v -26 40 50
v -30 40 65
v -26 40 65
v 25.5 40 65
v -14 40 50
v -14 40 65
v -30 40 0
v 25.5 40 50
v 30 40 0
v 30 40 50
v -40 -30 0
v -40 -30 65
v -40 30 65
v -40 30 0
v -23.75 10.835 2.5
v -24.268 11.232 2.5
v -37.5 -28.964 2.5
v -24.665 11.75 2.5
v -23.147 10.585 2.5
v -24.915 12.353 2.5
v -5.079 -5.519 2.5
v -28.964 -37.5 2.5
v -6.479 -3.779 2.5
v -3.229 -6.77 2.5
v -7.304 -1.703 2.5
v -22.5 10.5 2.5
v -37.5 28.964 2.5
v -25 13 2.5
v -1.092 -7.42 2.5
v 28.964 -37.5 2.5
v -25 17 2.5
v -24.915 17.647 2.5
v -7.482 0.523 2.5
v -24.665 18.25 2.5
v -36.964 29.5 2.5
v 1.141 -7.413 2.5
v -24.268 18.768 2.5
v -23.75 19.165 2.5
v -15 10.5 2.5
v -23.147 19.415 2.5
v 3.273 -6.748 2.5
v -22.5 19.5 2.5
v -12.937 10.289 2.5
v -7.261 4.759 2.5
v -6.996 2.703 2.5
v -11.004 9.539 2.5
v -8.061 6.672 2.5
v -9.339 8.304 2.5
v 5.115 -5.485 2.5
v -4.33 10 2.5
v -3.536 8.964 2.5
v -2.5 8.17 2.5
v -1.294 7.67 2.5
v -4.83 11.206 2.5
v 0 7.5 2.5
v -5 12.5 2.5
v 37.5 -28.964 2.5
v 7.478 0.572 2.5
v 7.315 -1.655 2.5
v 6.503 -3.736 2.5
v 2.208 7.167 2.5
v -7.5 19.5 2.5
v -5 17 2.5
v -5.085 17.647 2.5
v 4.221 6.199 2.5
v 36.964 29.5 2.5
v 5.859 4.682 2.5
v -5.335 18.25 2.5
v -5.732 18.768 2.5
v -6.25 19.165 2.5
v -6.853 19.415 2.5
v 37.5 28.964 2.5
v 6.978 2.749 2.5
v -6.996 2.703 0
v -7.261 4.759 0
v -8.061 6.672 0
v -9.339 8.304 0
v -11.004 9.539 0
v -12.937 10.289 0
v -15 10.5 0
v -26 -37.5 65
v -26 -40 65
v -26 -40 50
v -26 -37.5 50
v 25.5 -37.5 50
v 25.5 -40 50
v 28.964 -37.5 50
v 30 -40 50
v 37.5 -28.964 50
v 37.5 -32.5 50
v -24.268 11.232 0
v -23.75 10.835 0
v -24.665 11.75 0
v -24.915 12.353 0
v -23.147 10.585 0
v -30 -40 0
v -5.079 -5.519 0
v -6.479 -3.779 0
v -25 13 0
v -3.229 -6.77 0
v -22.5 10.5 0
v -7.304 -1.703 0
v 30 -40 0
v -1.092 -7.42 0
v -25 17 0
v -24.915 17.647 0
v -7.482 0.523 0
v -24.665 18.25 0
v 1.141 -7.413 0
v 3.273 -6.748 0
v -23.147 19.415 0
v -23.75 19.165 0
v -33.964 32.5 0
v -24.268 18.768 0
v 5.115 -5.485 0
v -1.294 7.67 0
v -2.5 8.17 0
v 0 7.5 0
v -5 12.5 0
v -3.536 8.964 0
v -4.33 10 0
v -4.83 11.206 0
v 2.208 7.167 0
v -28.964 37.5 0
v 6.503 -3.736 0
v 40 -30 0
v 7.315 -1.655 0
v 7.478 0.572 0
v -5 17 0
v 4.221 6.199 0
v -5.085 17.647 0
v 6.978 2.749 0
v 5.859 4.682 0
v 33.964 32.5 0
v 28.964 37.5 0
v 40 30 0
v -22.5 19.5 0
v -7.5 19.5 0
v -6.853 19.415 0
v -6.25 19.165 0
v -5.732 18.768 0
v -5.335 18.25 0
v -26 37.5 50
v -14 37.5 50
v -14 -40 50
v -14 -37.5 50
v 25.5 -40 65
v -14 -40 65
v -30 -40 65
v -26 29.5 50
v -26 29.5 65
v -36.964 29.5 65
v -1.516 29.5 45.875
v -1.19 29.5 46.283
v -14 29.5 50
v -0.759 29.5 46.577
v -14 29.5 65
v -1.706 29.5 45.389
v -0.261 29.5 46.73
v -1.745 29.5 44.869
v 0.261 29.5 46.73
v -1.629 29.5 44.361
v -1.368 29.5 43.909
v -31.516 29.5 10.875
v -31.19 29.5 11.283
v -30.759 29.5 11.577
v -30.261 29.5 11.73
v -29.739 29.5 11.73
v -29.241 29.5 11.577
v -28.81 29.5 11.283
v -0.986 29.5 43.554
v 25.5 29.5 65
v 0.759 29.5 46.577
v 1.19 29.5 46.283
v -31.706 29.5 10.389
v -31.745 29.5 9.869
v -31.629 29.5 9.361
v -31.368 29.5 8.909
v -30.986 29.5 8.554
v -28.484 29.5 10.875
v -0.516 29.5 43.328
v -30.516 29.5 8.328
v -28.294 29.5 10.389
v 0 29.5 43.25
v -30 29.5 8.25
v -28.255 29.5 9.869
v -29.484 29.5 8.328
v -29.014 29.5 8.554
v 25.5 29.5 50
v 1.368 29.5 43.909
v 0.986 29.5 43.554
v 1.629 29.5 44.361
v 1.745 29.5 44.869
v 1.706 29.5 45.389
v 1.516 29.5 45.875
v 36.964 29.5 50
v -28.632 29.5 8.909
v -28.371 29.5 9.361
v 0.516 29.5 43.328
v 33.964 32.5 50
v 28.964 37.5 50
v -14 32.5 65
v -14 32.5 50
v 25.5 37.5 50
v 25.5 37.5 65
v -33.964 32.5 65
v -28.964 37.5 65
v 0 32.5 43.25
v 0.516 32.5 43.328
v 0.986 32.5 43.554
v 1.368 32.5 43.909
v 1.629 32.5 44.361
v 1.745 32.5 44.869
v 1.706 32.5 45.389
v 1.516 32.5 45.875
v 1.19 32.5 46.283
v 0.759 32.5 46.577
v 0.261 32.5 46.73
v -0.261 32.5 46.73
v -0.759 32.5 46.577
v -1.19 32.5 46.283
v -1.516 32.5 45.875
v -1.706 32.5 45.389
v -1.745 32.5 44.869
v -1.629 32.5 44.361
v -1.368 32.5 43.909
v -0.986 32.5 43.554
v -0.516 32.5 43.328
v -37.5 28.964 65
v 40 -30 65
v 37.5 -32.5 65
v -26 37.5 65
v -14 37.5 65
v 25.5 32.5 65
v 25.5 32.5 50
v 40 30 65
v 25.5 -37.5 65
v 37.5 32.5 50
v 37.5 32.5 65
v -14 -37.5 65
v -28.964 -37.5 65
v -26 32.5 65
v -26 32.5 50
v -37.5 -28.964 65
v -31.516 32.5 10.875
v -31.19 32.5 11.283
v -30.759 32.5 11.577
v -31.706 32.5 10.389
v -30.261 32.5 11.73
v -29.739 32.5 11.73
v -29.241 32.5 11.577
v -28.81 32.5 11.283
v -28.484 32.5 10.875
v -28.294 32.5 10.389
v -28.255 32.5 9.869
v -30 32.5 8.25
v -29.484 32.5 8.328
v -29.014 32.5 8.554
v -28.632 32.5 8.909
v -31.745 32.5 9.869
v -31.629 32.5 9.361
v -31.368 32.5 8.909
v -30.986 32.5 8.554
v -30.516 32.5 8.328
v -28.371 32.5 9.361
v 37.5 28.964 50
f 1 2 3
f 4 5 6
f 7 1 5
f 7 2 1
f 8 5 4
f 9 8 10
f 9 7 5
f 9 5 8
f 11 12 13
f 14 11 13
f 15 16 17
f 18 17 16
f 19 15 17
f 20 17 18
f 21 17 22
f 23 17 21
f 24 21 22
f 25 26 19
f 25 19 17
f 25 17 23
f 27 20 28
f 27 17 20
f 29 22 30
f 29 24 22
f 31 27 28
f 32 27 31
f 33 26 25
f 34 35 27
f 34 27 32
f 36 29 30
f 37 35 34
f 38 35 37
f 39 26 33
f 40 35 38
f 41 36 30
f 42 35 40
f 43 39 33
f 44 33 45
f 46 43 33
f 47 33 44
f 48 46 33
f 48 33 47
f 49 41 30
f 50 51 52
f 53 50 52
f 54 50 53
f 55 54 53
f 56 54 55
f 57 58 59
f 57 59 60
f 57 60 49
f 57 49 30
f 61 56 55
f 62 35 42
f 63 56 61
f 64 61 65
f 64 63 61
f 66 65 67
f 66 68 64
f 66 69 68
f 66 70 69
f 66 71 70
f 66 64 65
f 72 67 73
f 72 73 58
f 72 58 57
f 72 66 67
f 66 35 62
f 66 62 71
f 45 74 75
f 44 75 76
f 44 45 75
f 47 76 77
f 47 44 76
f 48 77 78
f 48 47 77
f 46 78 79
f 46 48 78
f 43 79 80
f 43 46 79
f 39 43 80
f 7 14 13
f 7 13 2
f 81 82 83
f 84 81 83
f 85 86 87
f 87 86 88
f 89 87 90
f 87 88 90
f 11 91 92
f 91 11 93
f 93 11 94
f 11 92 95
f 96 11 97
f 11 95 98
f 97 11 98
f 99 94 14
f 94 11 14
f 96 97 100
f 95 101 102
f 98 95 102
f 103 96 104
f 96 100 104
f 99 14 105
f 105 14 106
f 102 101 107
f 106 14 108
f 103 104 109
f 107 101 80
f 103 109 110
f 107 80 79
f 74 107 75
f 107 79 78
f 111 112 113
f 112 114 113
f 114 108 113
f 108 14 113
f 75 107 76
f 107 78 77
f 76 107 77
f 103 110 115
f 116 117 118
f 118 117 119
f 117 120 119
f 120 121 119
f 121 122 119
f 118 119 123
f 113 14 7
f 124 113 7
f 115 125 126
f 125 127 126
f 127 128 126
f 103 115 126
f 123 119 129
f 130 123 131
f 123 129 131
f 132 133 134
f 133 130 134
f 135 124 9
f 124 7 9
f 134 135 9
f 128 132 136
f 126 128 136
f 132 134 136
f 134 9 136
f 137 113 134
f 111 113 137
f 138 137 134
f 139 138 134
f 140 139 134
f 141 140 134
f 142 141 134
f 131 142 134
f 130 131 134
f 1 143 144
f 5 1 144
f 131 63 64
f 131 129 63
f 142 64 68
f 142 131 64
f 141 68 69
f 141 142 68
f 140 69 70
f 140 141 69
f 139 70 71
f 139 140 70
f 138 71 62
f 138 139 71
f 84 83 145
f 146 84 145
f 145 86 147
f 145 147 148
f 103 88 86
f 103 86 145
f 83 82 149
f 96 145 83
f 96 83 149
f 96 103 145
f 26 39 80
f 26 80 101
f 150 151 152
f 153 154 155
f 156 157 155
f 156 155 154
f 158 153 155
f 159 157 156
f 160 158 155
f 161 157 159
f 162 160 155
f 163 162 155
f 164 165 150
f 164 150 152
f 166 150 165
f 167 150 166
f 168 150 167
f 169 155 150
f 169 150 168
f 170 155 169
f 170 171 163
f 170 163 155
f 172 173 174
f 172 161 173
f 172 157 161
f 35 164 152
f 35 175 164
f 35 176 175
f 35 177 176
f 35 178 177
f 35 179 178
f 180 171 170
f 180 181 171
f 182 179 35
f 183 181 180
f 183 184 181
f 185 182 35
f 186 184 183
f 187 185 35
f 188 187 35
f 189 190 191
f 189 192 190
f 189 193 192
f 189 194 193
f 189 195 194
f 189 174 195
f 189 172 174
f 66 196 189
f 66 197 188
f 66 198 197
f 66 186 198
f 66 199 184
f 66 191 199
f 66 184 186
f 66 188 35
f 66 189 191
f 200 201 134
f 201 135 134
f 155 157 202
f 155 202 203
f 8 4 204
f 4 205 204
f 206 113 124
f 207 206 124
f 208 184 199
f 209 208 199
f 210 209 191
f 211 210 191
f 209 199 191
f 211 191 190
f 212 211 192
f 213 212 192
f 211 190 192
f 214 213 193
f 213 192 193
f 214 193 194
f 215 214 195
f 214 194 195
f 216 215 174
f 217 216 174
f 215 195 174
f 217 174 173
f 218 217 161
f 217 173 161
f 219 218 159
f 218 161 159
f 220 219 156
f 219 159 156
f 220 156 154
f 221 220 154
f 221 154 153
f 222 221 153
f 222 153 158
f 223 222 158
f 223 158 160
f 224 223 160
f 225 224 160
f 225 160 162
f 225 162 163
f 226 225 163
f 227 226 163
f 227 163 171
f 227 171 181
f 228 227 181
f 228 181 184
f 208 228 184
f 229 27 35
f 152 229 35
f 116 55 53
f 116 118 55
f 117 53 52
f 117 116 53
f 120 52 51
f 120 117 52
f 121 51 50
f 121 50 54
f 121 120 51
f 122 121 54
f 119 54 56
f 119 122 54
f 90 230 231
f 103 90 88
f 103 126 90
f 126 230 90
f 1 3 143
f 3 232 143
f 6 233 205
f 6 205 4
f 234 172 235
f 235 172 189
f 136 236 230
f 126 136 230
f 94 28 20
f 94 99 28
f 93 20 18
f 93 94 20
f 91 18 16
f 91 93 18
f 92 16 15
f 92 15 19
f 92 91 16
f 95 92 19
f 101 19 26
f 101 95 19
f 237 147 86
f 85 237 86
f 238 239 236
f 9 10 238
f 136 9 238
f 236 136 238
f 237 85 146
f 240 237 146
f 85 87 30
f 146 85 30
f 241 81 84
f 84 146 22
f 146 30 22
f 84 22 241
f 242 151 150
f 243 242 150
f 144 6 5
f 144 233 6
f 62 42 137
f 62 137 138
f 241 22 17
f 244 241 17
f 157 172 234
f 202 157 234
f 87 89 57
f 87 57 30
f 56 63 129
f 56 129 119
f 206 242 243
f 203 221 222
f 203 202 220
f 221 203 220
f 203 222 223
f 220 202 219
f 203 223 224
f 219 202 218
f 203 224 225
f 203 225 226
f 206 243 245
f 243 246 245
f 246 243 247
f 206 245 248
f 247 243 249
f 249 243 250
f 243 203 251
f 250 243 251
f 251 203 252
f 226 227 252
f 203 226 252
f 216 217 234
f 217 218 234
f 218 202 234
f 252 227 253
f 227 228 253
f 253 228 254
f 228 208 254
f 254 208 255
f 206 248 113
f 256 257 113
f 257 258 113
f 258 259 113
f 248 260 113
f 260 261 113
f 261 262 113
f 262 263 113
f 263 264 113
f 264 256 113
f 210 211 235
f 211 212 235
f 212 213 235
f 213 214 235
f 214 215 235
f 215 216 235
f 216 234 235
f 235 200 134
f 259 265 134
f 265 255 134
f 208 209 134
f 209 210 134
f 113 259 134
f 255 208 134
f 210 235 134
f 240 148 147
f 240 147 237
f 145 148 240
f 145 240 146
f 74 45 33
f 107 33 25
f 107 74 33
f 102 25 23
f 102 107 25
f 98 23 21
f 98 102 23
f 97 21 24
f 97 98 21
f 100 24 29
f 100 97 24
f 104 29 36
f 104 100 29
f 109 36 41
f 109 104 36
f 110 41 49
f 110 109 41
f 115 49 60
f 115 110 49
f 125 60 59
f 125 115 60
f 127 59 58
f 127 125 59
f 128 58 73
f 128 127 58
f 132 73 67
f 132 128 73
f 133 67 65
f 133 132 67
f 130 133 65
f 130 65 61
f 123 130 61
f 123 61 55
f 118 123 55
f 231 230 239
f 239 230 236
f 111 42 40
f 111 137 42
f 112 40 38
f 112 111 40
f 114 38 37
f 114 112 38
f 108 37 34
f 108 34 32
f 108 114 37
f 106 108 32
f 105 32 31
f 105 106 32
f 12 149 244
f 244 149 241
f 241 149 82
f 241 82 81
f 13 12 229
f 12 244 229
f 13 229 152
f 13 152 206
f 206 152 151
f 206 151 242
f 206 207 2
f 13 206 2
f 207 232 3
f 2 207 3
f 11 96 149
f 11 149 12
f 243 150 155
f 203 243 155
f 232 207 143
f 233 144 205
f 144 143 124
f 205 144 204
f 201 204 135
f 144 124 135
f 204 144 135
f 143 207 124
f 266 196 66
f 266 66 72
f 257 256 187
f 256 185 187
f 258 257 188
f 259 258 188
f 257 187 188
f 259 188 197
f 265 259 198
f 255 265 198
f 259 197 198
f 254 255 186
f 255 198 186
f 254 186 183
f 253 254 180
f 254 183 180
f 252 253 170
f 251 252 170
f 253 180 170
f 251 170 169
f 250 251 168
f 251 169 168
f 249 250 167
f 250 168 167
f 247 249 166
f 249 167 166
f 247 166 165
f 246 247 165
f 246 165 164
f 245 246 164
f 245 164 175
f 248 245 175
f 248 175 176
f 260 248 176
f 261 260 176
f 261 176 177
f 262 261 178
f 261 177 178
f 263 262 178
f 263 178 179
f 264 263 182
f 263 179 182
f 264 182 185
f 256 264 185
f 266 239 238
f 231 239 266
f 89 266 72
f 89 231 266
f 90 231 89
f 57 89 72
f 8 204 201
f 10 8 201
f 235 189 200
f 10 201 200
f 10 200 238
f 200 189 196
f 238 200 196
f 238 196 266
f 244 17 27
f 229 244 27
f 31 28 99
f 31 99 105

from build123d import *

# Parameters (mm, degrees)
BOSS_EXTRUDE1_DEPTH             = 65
SKETCH2_R                       = 7.5
BOSS_EXTRUDE2_DEPTH             = 2.5
BOSS_EXTRUDE3_REACH             = 88.168
SKETCH3_W                       = 65
SKETCH3_H                       = 3
BOSS_EXTRUDE3_DIRECTION_2_REACH = 88.168
CUT_EXTRUDE2_REACH              = 124.042
SKETCH6_R                       = 1.75
CUT_EXTRUDE3_REACH              = 86.299
CUT_EXTRUDE4_REACH              = 86.299
FILLET1_R                       = 2.5
FILLET2_R                       = 5
CUT_EXTRUDE5_DEPTH              = 111.566721937
CUT_EXTRUDE5_DEPTH_BACK         = 111.566721937
SKETCH9_W                       = 12
SKETCH9_H                       = 32.949220019
SKETCH9_H_2                     = 17.949220019


with BuildPart() as part:
    # Sketch1 → Boss-Extrude1 (new body)
    with BuildSketch(Plane.XY):
        Polygon((-40, 30), (-30, 40), (30, 40), (40, 30), (40, -30), (30, -40), (-30, -40), (-40, -30), align=None)
        Polygon((-37.5, 28.964466094), (-28.964466094, 37.5), (28.964466094, 37.5), (37.5, 28.964466094), (37.5, -28.964466094), (28.964466094, -37.5), (-28.964466094, -37.5), (-37.5, -28.964466094), align=None, mode=Mode.SUBTRACT)
    extrude(amount=BOSS_EXTRUDE1_DEPTH)

    # Sketch2 → Boss-Extrude2 (add)
    with BuildSketch(Plane.XY):
        Polygon((37.5, 28.964466094), (28.964466094, 37.5), (-28.964466094, 37.5), (-37.5, 28.964466094), (-37.5, -28.964466094), (-28.964466094, -37.5), (28.964466094, -37.5), (37.5, -28.964466094), align=None)
        Circle(SKETCH2_R, mode=Mode.SUBTRACT)
    extrude(amount=BOSS_EXTRUDE2_DEPTH)

    # Boss-Extrude3: up to this plane
    boss_extrude3_end = Plane(origin=(28.964466094, 37.5, 65), z_dir=(-0.7071067811865476, -0.7071067811865476, 0))
    # Sketch3 → Boss-Extrude3 (add, up to the surface)
    with BuildSketch(Plane(origin=(0, 0, 0), x_dir=(0, 0, -1), z_dir=(1, 0, 0)), mode=Mode.PRIVATE) as boss_extrude3_sk1:
        with Locations((-32.5, 31)):
            Rectangle(SKETCH3_W, SKETCH3_H)
    boss_extrude3_tool1 = split(extrude(boss_extrude3_sk1.sketch, amount=BOSS_EXTRUDE3_REACH, mode=Mode.PRIVATE), bisect_by=boss_extrude3_end, keep=Keep.BOTH, mode=Mode.PRIVATE)
    add(boss_extrude3_tool1.solids().sort_by_distance((0, 31, 32.5))[0])

    # Boss-Extrude3 direction 2: up to this plane
    boss_extrude3_direction_2_end = Plane(origin=(-37.5, 28.964466094, 65), z_dir=(0.707106781186547, -0.7071067811865481, 0))
    # Sketch3 → Boss-Extrude3 direction 2 (add, up to the surface)
    with BuildSketch(Plane(origin=(0, 0, 0), x_dir=(0, 0, -1), z_dir=(1, 0, 0)), mode=Mode.PRIVATE) as boss_extrude3_direction_2_sk1:
        with Locations((-32.5, 31)):
            Rectangle(SKETCH3_W, SKETCH3_H)
    boss_extrude3_direction_2_tool1 = split(extrude(boss_extrude3_direction_2_sk1.sketch, amount=-BOSS_EXTRUDE3_DIRECTION_2_REACH, mode=Mode.PRIVATE), bisect_by=boss_extrude3_direction_2_end, keep=Keep.BOTH, mode=Mode.PRIVATE)
    add(boss_extrude3_direction_2_tool1.solids().sort_by_distance((0, 31, 32.5))[0])

    # Sketch6 → Cut-Extrude2 (cut, up to next)
    with BuildSketch(Plane(origin=(0, 29.5, -27), x_dir=(-1, 0, 0), z_dir=(0, -1, 0)), mode=Mode.PRIVATE) as cut_extrude2_sk1:
        with Locations(Location((0, -72, 0), (0, 0, 90))):
            Circle(SKETCH6_R)
    cut_extrude2_tool1 = extrude(cut_extrude2_sk1.sketch, amount=-CUT_EXTRUDE2_REACH, mode=Mode.PRIVATE) & part.part
    # Sketch6 → Cut-Extrude2 (cut, up to next)
    with BuildSketch(Plane(origin=(0, 29.5, -27), x_dir=(-1, 0, 0), z_dir=(0, -1, 0)), mode=Mode.PRIVATE) as cut_extrude2_sk2:
        with Locations(Location((30, -37, 0), (0, 0, 90))):
            Circle(SKETCH6_R)
    cut_extrude2_tool2 = extrude(cut_extrude2_sk2.sketch, amount=-CUT_EXTRUDE2_REACH, mode=Mode.PRIVATE) & part.part
    add(cut_extrude2_tool1.solids().sort_by_distance((0, 29.5, 45))[0], mode=Mode.SUBTRACT)
    add(cut_extrude2_tool2.solids().sort_by_distance((-30, 29.5, 10))[0], mode=Mode.SUBTRACT)

    # Sketch7 → Cut-Extrude3 (cut, up to next)
    with BuildSketch(Plane.XY.offset(2.5), mode=Mode.PRIVATE) as cut_extrude3_sk1:
        Polygon((-33.964466094, 32.5), (-28.964466094, 37.5), (28.964466094, 37.5), (33.964466094, 32.5), align=None)
    cut_extrude3_tool1 = extrude(cut_extrude3_sk1.sketch, amount=-CUT_EXTRUDE3_REACH, mode=Mode.PRIVATE) & part.part
    add(cut_extrude3_tool1.solids().sort_by_distance((0, 34.933788, 2.5))[0], mode=Mode.SUBTRACT)

    # Sketch8 → Cut-Extrude4 (cut, up to next)
    with BuildSketch(Plane.XY.offset(2.5), mode=Mode.PRIVATE) as cut_extrude4_sk1:
        with BuildLine():
            Line((-5, 7.5), (0, 7.5))
            Line((0, 7.5), (-7.5, 0))
            ThreePointArc((-7.5, 0), (-8.440285268, 7.256939094), (-15, 10.5))
            Line((-15, 10.5), (-25, 10.5))
            Line((-25, 10.5), (-25, 19.5))
            Line((-25, 19.5), (-5, 19.5))
            Line((-5, 19.5), (-5, 7.5))
        make_face()
    cut_extrude4_tool1 = extrude(cut_extrude4_sk1.sketch, amount=-CUT_EXTRUDE4_REACH, mode=Mode.PRIVATE) & part.part
    add(cut_extrude4_tool1.solids().sort_by_distance((-13.255262, 13.384188, 2.5))[0], mode=Mode.SUBTRACT)

    # Fillet1
    fillet1_edges = [part.edges().sort_by_distance(p)[0] for p in [
        (-25, 10.5, 1.25),
        (-25, 19.5, 1.25),
        (-5, 19.5, 1.25),
    ]]
    fillet(fillet1_edges, radius=FILLET1_R)

    # Fillet2
    fillet2_edges = [part.edges().sort_by_distance(p)[0] for p in [
        (-5, 7.5, 1.25),
    ]]
    fillet(fillet2_edges, radius=FILLET2_R - 0.0001)  # a hair under: the kernel refuses the full size

    # Sketch9 → Cut-Extrude5 (cut, two sides: drawn at the far end of the back side and taken through both)
    with BuildSketch(Plane(origin=(0, 40, 0), x_dir=(1, 0, 0), z_dir=(0, 1, 0)).offset(-CUT_EXTRUDE5_DEPTH_BACK)):
        with Locations((31.5, -66.474610009)):
            Rectangle(SKETCH9_W, SKETCH9_H)
        with Locations((-20, -58.97461001)):
            Rectangle(SKETCH9_W, SKETCH9_H_2)
    extrude(amount=CUT_EXTRUDE5_DEPTH + CUT_EXTRUDE5_DEPTH_BACK, mode=Mode.SUBTRACT)


solid = part.part
